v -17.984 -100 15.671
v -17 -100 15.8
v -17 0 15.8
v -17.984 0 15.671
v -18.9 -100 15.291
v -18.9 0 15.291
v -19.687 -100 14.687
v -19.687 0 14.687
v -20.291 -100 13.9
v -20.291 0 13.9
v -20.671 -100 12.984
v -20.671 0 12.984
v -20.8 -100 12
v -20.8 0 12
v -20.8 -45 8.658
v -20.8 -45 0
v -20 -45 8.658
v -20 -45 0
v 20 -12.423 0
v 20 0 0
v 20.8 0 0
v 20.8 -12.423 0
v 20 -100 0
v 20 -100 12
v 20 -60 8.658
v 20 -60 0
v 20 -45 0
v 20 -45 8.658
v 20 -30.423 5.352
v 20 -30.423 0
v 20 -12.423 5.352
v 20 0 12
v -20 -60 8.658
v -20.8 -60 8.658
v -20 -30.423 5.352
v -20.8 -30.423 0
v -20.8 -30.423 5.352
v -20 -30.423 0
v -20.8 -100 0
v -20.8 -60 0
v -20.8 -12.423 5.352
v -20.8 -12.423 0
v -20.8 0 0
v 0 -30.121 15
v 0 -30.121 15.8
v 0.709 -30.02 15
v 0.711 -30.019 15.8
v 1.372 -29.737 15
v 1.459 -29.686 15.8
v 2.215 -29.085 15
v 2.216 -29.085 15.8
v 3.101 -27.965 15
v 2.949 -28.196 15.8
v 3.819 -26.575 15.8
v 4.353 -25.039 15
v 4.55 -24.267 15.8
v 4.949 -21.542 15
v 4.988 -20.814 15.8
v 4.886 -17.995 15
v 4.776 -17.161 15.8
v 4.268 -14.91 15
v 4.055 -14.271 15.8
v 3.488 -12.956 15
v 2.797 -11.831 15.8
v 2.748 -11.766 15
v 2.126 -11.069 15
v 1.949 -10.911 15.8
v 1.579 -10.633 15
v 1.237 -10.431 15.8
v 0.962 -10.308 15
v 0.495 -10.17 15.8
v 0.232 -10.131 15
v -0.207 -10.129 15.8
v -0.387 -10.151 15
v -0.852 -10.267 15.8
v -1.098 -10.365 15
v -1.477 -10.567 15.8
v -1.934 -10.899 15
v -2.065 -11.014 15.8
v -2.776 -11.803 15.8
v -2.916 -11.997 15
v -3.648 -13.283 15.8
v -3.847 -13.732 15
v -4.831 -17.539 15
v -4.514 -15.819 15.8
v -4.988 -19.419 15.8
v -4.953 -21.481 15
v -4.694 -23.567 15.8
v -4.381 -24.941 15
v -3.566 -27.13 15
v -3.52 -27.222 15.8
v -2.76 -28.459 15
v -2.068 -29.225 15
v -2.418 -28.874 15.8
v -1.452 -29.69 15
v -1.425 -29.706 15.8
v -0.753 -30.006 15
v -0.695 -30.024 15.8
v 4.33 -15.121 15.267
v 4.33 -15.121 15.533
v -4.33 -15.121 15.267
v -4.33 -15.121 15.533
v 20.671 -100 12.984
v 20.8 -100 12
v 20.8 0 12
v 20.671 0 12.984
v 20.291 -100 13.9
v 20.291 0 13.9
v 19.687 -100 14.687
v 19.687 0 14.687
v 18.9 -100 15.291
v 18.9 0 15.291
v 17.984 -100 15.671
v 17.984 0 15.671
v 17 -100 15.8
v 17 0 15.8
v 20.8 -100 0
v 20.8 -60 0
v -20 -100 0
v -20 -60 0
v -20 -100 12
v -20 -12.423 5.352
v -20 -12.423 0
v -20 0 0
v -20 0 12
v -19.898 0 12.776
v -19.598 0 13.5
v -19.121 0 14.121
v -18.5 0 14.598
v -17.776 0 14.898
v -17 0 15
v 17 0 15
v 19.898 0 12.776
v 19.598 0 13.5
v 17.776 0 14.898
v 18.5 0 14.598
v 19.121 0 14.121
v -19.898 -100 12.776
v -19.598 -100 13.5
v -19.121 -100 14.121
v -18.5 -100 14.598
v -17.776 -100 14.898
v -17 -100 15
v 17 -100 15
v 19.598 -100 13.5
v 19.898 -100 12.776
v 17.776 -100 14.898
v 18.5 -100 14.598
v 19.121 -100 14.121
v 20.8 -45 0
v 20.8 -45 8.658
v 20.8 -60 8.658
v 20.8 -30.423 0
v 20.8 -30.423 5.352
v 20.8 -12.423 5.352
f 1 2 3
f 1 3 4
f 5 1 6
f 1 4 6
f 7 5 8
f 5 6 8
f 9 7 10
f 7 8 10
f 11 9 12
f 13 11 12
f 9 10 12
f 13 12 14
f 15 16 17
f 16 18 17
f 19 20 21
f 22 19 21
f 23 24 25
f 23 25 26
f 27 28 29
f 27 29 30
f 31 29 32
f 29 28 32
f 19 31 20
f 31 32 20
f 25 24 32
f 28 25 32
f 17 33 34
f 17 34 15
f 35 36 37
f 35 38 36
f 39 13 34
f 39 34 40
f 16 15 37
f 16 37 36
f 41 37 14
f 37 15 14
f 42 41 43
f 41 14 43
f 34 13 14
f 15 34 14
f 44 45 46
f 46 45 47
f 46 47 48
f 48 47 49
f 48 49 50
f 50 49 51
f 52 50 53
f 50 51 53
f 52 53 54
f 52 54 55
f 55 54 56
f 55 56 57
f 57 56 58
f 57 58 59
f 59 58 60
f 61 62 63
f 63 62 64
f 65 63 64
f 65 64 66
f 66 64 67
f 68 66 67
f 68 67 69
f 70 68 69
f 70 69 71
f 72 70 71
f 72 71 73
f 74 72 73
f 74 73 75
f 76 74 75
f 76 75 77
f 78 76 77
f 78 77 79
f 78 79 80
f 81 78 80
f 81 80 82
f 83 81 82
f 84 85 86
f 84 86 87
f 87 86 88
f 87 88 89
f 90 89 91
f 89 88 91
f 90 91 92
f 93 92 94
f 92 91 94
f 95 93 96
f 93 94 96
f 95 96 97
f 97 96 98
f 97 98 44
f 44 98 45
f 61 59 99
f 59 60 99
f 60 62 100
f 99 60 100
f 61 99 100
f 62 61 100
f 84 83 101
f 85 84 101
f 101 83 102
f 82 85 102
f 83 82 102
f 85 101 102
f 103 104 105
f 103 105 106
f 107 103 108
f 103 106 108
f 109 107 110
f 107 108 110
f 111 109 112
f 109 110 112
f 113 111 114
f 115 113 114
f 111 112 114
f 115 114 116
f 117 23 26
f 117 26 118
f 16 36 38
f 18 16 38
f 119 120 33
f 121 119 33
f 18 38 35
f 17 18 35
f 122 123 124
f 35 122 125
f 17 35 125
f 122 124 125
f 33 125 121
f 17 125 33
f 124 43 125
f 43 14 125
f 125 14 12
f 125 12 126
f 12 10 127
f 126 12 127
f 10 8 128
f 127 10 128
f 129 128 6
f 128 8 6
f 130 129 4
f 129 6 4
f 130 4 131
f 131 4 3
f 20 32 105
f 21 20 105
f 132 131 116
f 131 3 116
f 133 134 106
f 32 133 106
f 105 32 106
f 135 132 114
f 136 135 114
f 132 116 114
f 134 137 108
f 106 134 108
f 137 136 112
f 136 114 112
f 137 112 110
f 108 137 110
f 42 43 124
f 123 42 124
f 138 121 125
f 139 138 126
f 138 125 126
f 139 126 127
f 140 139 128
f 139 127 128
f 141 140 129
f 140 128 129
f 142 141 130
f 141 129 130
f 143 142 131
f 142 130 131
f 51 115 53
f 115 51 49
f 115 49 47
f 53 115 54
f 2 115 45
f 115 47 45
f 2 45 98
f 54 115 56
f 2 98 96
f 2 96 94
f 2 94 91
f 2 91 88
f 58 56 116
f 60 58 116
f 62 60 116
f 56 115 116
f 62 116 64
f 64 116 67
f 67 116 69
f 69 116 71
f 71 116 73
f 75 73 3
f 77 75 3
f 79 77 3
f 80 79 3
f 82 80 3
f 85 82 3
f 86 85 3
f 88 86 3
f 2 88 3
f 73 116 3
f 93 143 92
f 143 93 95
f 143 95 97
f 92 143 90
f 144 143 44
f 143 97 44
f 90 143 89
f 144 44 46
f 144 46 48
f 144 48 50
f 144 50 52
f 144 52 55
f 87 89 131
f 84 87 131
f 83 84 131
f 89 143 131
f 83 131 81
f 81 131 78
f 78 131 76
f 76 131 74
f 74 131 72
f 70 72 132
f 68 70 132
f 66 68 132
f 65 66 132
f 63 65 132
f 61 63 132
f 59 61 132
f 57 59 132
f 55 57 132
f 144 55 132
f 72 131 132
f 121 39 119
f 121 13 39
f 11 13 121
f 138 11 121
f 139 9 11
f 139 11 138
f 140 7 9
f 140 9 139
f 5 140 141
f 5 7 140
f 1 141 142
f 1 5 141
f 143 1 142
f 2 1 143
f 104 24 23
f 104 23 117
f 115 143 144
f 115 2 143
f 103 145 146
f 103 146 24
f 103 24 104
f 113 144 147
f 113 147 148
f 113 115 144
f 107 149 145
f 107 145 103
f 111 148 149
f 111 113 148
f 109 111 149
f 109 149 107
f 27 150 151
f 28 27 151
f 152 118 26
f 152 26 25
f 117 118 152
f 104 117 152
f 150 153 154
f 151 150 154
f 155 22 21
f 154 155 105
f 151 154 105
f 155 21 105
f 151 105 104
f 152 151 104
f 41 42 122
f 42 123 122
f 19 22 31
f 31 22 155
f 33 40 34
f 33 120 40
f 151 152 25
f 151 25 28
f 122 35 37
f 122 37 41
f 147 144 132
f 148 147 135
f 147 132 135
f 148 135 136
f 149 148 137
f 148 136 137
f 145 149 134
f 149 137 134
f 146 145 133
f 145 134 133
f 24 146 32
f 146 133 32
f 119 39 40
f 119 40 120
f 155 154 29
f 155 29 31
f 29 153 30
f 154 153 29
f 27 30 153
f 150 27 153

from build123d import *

# Parameters (mm, degrees)
F1_DEPTH = 100
F3_W     = 15
F3_H     = 8.658207
F3_W_2   = 18
F3_H_2   = 5.351609
F4_DEPTH = 41.601
F5_DEPTH = 15.801


with BuildPart() as f1:
    # F0 (on Front) → F1 (new body)
    with BuildSketch(Plane.XZ):
        with BuildLine():
            Line((-20.8, 0), (-20, 0))
            Line((-20, 0), (-20, 12))
            ThreePointArc((-20, 12), (-19.12132, 14.12132), (-17, 15))
            Line((-17, 15), (0, 15))
            Line((0, 15), (17, 15))
            ThreePointArc((17, 15), (19.12132, 14.12132), (20, 12))
            Line((20, 12), (20, 0))
            Line((20, 0), (20.8, 0))
            Line((20.8, 0), (20.8, 12))
            ThreePointArc((20.8, 12), (19.687006, 14.687006), (17, 15.8))
            Line((17, 15.8), (2.5, 15.8))
            Line((2.5, 15.8), (-2.5, 15.8))
            Line((-2.5, 15.8), (-17, 15.8))
            ThreePointArc((-17, 15.8), (-19.687006, 14.687006), (-20.8, 12))
            Line((-20.8, 12), (-20.8, 0))
        make_face()
    extrude(amount=F1_DEPTH)

    # F3 (on face) → F4 (cut, through all)
    with BuildSketch(Plane.YZ.offset(20.8)):
        with Locations((-52.5, 4.329103)):
            Rectangle(F3_W, F3_H)
        with Locations((-21.423438, 2.675804)):
            Rectangle(F3_W_2, F3_H_2)
    extrude(amount=-F4_DEPTH, mode=Mode.SUBTRACT)

    # F2 (on face) → F5 (cut, through all)
    with BuildSketch(Plane.XY.offset(15.8)):
        with BuildLine():
            add(Edge.make_bspline(
                [(0, -30.120598), (8.660254, -30.120598), (4.330127, -15.120598), (0, -0.120598), (-4.330127, -15.120598), (-8.660254, -30.120598), (0, -30.120598)],
                knots=[0, 0, 0, 2.094395, 2.094395, 4.18879, 4.18879, 6.283185, 6.283185, 6.283185], degree=2, weights=[1, 0.5, 1, 0.5, 1, 0.5, 1]))
        make_face()
    extrude(amount=-F5_DEPTH, mode=Mode.SUBTRACT)


solid = f1.part
